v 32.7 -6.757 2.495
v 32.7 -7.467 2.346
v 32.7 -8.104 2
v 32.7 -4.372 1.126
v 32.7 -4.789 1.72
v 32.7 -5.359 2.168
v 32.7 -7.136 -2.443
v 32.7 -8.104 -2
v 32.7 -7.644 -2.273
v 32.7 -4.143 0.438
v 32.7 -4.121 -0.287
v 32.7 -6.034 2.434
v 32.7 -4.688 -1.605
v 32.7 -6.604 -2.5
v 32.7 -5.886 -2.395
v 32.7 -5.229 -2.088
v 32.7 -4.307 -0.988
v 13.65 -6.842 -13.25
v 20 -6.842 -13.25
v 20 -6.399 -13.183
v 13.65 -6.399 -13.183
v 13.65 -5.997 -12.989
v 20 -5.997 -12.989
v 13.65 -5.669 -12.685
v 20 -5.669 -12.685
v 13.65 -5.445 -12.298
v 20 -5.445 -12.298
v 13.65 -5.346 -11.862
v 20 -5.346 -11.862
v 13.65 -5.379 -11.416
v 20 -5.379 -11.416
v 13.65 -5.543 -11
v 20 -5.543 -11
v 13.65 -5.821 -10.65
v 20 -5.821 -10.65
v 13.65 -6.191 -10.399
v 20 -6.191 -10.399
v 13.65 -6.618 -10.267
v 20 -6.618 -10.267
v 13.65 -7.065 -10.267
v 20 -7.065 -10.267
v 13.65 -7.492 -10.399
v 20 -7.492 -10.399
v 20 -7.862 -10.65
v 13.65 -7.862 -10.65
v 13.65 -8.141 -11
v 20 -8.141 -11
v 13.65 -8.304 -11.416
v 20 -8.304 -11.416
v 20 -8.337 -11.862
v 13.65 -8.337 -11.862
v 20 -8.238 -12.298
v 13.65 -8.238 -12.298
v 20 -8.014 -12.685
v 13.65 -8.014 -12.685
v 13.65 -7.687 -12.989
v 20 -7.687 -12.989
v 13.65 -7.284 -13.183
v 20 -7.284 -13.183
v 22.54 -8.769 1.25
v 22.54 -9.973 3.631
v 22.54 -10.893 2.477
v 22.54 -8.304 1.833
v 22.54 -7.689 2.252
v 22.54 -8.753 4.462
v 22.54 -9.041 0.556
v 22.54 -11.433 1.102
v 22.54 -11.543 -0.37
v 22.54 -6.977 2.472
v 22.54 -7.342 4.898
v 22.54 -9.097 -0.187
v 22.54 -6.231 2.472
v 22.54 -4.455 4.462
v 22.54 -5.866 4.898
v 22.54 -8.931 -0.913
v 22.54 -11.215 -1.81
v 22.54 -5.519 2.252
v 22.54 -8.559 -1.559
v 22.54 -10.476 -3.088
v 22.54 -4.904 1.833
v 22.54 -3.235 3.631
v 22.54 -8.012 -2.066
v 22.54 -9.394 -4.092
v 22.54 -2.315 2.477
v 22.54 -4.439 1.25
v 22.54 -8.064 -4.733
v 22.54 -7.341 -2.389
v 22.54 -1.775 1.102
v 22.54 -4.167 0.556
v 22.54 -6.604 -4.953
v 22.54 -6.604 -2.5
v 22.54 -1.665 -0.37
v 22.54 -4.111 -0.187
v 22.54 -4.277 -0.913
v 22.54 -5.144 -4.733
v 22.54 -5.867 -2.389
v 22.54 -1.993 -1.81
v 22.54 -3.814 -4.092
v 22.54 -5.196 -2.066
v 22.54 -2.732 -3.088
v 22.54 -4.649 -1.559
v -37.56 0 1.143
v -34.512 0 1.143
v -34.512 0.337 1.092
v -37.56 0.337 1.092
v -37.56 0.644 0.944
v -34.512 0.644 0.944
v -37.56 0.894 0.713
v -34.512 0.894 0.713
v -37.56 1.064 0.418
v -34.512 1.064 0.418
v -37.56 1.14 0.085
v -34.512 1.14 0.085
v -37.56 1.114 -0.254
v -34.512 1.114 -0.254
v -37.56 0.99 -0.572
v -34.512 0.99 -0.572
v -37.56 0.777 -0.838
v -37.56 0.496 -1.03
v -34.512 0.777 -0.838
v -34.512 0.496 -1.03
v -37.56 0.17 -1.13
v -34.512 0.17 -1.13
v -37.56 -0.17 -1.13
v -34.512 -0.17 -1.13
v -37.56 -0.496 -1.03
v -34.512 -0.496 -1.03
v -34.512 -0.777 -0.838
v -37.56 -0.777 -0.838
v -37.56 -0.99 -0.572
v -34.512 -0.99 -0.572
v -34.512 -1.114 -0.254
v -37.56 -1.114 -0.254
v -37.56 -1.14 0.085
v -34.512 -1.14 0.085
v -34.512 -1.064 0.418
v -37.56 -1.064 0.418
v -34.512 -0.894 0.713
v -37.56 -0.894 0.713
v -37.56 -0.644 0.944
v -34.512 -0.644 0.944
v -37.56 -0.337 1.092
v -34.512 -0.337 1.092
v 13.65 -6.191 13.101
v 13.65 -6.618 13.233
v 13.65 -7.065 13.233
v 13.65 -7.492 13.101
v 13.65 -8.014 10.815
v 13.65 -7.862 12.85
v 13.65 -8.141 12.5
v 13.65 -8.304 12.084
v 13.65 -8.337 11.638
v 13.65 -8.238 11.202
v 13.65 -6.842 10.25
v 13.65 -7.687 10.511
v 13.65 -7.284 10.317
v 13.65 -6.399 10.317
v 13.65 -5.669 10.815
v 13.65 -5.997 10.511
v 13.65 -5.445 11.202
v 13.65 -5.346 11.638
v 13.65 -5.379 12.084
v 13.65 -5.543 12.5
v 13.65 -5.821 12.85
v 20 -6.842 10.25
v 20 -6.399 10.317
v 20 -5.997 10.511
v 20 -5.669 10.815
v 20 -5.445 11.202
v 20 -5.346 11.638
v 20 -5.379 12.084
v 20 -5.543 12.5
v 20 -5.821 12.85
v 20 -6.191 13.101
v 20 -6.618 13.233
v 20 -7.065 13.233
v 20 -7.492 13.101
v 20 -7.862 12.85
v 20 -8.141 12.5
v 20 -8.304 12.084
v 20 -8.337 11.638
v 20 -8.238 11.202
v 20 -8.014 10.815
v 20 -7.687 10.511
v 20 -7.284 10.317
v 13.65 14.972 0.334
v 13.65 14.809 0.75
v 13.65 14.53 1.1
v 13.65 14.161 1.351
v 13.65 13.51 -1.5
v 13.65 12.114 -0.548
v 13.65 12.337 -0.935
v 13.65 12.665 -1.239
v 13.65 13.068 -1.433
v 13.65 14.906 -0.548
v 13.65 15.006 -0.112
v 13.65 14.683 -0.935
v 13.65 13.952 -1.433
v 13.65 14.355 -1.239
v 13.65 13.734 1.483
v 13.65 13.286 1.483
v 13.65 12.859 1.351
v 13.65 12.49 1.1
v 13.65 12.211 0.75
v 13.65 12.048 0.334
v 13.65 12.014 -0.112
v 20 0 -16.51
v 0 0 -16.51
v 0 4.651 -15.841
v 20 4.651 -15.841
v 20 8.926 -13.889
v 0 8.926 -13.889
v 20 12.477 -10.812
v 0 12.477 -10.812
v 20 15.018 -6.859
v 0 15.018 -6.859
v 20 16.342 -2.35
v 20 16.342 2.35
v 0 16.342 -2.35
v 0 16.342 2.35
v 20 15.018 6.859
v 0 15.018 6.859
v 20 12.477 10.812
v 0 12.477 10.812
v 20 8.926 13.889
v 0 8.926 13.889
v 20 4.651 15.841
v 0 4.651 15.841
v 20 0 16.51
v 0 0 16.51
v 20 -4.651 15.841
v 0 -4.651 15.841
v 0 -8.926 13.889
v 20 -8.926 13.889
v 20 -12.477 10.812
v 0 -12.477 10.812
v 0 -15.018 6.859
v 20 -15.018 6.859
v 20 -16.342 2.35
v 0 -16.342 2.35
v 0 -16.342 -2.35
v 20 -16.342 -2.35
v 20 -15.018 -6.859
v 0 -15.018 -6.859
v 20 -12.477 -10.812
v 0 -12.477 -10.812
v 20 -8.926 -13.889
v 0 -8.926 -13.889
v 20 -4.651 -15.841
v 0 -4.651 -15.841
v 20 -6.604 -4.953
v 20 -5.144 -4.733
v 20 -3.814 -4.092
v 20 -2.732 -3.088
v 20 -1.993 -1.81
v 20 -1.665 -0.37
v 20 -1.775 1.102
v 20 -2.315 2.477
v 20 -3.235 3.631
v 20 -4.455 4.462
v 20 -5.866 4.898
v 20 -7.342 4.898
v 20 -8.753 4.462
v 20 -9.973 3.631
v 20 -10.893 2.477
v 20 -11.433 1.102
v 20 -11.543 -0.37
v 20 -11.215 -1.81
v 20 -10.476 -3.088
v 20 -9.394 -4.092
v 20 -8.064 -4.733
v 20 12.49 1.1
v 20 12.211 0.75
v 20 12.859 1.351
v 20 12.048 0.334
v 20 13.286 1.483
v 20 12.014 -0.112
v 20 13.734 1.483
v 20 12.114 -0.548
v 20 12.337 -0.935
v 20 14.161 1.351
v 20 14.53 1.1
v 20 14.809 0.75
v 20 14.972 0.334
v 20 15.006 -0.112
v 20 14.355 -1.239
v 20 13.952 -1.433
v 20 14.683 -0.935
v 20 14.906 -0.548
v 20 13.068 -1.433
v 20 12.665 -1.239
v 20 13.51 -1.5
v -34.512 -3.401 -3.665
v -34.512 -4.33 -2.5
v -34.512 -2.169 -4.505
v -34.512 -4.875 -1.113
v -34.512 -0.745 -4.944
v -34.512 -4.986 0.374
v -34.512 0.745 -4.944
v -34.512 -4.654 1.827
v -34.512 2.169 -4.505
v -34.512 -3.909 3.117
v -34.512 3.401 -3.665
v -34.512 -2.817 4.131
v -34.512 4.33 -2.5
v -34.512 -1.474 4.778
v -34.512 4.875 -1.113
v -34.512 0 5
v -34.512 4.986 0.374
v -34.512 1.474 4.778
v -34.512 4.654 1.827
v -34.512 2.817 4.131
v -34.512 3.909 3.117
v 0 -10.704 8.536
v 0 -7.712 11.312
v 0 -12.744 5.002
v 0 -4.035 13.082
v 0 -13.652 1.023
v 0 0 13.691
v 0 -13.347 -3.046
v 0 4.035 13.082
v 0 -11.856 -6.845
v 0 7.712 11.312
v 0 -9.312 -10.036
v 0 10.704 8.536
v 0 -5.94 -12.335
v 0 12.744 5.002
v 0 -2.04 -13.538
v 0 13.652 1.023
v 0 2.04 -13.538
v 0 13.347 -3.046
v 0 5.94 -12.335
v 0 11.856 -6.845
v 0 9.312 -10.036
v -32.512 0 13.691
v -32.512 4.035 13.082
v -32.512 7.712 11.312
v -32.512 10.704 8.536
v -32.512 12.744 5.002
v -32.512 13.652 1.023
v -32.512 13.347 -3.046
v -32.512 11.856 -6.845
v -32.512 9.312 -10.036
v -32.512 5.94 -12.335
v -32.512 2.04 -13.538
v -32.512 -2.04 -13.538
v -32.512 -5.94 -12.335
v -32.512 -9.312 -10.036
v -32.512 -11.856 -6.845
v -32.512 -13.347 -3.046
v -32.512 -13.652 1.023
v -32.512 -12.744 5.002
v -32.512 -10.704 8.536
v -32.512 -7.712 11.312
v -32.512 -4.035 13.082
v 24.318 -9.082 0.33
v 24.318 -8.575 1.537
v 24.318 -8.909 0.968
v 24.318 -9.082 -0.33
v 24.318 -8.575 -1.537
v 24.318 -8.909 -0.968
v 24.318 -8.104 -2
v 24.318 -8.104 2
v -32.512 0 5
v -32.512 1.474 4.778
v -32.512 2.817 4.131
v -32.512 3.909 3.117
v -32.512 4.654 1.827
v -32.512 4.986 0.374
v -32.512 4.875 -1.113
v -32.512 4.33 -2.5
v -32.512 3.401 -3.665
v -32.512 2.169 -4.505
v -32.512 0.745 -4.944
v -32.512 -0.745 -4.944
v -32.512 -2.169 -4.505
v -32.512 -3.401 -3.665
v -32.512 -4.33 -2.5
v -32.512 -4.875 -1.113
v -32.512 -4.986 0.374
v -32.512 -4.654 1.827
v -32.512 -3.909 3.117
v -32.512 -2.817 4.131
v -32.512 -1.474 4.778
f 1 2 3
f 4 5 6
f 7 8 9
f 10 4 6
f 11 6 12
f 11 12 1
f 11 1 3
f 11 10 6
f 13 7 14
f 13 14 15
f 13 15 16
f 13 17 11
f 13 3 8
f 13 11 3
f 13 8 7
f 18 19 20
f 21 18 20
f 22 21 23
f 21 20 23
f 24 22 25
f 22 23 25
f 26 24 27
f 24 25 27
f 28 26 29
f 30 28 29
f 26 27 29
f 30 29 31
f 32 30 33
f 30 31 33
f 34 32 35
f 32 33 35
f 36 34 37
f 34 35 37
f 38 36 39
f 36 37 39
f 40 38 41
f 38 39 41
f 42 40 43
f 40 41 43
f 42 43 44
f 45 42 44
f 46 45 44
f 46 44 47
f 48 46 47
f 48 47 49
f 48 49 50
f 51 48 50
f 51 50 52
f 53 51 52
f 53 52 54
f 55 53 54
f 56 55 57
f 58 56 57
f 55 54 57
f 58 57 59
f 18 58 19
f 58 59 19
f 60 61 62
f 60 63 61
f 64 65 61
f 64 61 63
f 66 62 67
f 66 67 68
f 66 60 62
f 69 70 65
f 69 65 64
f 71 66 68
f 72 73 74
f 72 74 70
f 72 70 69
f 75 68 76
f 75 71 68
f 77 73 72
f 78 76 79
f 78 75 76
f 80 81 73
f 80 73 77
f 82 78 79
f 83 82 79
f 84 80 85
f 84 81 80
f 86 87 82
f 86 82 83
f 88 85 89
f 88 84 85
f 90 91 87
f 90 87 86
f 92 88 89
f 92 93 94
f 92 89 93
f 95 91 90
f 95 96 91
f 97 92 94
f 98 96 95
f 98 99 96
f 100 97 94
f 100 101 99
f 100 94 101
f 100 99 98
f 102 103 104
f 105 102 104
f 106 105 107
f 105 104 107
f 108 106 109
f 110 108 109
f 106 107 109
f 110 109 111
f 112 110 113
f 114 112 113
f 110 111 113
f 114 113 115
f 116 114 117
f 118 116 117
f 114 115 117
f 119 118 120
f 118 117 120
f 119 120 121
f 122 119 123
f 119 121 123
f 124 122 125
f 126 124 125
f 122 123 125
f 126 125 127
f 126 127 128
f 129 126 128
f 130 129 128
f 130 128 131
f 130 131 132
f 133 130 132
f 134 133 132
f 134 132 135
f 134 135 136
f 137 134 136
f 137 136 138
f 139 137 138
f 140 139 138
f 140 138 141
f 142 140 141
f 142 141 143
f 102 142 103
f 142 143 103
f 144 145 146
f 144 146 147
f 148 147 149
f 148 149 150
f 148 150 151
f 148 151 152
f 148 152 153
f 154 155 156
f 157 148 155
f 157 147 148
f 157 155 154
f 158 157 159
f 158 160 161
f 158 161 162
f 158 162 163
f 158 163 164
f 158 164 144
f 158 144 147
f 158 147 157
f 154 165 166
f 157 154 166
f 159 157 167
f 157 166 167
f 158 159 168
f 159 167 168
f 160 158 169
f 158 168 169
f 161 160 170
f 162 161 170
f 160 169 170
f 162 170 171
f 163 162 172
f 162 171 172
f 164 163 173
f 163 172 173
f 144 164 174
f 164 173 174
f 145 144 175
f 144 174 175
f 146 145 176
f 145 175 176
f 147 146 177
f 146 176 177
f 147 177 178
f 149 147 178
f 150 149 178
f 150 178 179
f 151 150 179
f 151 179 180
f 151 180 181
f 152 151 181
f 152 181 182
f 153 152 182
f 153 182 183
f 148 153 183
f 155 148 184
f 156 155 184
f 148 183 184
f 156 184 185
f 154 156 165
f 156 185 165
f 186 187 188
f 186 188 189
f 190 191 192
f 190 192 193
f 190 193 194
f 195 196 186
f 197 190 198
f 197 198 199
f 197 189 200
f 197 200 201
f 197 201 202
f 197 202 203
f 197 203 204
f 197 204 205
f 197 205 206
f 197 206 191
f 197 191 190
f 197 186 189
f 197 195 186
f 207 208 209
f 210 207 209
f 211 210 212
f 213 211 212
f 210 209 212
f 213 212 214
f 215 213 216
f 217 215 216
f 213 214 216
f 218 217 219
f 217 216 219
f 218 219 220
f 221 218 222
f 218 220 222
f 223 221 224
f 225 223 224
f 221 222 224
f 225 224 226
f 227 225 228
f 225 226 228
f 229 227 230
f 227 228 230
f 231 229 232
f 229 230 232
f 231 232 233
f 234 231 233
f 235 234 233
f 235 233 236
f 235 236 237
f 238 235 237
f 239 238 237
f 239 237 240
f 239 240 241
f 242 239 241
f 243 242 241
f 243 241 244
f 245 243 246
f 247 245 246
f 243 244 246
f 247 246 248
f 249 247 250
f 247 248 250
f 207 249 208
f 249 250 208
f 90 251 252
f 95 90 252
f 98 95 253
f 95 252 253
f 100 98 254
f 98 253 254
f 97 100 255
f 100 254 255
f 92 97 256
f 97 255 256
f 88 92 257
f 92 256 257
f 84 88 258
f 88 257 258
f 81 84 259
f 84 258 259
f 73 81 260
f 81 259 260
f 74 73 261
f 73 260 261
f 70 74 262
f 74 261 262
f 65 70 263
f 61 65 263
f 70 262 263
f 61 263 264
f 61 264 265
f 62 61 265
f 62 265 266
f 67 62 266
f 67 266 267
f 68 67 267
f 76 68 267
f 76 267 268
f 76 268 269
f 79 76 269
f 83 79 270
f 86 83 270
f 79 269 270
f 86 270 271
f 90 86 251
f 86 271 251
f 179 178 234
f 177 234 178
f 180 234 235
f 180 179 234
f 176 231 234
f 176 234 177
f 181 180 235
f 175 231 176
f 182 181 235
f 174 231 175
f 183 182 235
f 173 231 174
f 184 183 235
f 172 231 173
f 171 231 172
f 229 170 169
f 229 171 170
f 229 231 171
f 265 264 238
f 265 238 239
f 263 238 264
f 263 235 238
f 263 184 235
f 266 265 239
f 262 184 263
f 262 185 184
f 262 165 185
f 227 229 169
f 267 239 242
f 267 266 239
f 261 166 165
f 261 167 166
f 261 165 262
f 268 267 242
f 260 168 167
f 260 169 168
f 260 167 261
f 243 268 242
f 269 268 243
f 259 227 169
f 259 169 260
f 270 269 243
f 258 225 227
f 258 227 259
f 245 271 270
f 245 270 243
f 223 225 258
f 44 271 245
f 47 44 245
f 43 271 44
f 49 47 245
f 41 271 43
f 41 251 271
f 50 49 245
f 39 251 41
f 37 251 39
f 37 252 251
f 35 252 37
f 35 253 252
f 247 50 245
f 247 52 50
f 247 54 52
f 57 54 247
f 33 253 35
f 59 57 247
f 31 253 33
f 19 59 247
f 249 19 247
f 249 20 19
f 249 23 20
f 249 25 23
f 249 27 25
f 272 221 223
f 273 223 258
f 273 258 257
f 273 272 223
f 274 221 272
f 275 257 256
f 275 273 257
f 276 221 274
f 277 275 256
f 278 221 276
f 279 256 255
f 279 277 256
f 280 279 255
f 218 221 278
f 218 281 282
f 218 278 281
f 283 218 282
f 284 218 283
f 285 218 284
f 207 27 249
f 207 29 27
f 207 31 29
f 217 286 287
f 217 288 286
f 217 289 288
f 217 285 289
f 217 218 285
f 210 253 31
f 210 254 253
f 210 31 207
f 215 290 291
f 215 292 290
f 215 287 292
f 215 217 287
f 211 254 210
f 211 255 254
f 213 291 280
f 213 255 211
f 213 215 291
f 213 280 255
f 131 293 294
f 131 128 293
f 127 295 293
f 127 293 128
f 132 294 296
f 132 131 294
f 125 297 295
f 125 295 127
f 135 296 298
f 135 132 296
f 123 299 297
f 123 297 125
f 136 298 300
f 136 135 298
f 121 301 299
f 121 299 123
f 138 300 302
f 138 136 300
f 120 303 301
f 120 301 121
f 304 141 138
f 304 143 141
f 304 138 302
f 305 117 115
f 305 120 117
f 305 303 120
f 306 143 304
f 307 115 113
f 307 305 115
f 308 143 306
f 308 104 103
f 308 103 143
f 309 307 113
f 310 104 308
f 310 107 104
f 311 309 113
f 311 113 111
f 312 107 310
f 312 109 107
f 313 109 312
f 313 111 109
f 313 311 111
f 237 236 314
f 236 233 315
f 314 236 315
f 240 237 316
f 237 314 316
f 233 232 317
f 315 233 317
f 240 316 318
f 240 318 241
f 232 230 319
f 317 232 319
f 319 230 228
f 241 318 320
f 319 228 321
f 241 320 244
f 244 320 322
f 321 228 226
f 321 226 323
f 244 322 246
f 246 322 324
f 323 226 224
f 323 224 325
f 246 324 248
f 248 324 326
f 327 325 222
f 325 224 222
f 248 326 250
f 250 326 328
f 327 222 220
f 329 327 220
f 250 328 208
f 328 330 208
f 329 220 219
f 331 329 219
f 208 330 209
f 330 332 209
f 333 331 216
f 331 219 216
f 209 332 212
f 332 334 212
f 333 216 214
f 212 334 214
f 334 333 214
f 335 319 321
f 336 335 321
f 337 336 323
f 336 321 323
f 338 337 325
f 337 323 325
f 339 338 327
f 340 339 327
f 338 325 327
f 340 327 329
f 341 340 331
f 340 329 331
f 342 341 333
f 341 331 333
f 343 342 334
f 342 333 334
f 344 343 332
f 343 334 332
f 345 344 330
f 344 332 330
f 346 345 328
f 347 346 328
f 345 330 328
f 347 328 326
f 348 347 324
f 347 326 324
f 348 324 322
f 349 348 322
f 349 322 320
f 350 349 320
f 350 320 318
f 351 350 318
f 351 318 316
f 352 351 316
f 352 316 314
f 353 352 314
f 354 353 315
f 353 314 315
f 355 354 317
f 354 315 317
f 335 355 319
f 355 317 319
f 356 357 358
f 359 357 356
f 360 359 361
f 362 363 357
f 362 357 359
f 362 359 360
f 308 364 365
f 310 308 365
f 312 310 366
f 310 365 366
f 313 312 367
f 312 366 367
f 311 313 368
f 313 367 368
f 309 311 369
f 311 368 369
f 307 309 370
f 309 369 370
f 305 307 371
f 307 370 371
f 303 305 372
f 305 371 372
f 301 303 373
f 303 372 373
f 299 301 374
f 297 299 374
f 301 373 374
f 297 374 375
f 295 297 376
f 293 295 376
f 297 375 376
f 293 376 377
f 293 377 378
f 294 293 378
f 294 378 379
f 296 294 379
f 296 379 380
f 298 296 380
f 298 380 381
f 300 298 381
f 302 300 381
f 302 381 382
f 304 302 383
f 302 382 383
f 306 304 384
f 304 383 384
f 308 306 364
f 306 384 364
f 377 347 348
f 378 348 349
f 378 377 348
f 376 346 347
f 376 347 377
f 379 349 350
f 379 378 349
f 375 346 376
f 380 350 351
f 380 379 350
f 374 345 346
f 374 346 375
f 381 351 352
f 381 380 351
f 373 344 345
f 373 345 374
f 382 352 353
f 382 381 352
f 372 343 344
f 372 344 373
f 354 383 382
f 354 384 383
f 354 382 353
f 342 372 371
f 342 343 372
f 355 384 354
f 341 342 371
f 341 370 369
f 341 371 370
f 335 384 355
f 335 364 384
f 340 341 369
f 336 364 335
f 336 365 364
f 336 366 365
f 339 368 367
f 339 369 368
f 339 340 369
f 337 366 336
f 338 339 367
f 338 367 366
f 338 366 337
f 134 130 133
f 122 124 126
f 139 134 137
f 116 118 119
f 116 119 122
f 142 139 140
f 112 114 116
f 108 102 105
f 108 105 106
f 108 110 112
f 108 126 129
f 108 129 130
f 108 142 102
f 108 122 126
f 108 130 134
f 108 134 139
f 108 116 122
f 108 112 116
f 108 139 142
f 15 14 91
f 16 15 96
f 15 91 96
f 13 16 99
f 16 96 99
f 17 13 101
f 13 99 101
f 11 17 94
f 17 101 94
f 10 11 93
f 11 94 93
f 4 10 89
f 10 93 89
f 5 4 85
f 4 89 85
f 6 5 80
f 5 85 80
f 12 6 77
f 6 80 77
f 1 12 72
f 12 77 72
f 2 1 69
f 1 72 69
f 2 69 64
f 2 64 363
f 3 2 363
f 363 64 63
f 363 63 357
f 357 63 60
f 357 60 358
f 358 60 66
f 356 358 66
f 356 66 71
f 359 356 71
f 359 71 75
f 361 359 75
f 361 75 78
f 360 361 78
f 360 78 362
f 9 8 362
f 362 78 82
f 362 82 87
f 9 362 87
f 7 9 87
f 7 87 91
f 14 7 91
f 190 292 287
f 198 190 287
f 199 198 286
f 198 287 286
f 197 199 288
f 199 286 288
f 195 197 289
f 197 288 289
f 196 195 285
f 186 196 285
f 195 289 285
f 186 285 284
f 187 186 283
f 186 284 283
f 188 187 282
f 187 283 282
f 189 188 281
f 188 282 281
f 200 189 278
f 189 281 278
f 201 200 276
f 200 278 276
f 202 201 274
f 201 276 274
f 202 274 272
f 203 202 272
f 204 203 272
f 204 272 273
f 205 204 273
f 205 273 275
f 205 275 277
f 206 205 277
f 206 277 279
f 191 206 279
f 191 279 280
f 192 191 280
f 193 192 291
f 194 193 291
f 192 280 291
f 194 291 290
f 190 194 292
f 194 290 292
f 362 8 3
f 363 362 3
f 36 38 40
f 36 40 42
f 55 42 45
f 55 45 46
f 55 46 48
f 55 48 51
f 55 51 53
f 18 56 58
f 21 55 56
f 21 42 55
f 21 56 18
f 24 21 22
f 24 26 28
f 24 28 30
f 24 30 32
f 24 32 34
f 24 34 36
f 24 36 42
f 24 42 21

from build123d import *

# Parameters (mm, degrees)
SKETCH1_R           = 16.51
BOSS_EXTRUDE2_DEPTH = 20
SKETCH2_R           = 13.6906
BOSS_EXTRUDE3_DEPTH = 32.512
SKETCH3_R           = 1.5
CUT_EXTRUDE1_DEPTH  = 6.35
SKETCH4_R           = 4.953
BOSS_EXTRUDE4_DEPTH = 2.54
SKETCH5_R           = 2.5
BOSS_EXTRUDE5_DEPTH = 10.16
SKETCH6_R           = 5
BOSS_EXTRUDE6_DEPTH = 2
SKETCH7_R           = 1.143
BOSS_EXTRUDE7_DEPTH = 3.048
CUT_EXTRUDE2_DEPTH  = 8.382


with BuildPart() as part:
    # Sketch1 → Boss-Extrude2 (new body)
    with BuildSketch(Plane(origin=(0, 0, 0), x_dir=(0, 0, -1), z_dir=(1, 0, 0))):
        Circle(SKETCH1_R)
    extrude(amount=BOSS_EXTRUDE2_DEPTH)

    # Sketch2 → Boss-Extrude3 (add)
    with BuildSketch(Plane.ZY):
        Circle(SKETCH2_R)
    extrude(amount=BOSS_EXTRUDE3_DEPTH)

    # Sketch3 → Cut-Extrude1 (cut)
    with BuildSketch(Plane(origin=(20, 0, 0), x_dir=(0, 0, -1), z_dir=(1, 0, 0))):
        with Locations((0, 13.51)):
            Circle(SKETCH3_R)
        with Locations((11.75, -6.841596989)):
            Circle(SKETCH3_R)
        with Locations((-11.75, -6.841596989)):
            Circle(SKETCH3_R)
    extrude(amount=-CUT_EXTRUDE1_DEPTH, mode=Mode.SUBTRACT)

    # Sketch4 → Boss-Extrude4 (add)
    with BuildSketch(Plane(origin=(20, 0, 0), x_dir=(0, 0, -1), z_dir=(1, 0, 0))):
        with Locations((0, -6.604)):
            Circle(SKETCH4_R)
    extrude(amount=BOSS_EXTRUDE4_DEPTH)

    # Sketch5 → Boss-Extrude5 (add)
    with BuildSketch(Plane(origin=(22.54, 0, 0), x_dir=(0, 0, -1), z_dir=(1, 0, 0))):
        with Locations((0, -6.604)):
            Circle(SKETCH5_R)
    extrude(amount=BOSS_EXTRUDE5_DEPTH)

    # Sketch6 → Boss-Extrude6 (add)
    with BuildSketch(Plane.ZY.offset(32.512)):
        Circle(SKETCH6_R)
    extrude(amount=BOSS_EXTRUDE6_DEPTH)

    # Sketch7 → Boss-Extrude7 (add)
    with BuildSketch(Plane.ZY.offset(34.512)):
        Circle(SKETCH7_R)
    extrude(amount=BOSS_EXTRUDE7_DEPTH)

    # Sketch8 → Cut-Extrude2 (cut)
    with BuildSketch(Plane(origin=(32.7, 0, 0), x_dir=(0, 0, -1), z_dir=(1, 0, 0))):
        with BuildLine():
            Line((2, -8.104), (-2, -8.104))
            ThreePointArc((-2, -8.104), (0, -9.104), (2, -8.104))
        make_face()
    extrude(amount=-CUT_EXTRUDE2_DEPTH, mode=Mode.SUBTRACT)


solid = part.part
